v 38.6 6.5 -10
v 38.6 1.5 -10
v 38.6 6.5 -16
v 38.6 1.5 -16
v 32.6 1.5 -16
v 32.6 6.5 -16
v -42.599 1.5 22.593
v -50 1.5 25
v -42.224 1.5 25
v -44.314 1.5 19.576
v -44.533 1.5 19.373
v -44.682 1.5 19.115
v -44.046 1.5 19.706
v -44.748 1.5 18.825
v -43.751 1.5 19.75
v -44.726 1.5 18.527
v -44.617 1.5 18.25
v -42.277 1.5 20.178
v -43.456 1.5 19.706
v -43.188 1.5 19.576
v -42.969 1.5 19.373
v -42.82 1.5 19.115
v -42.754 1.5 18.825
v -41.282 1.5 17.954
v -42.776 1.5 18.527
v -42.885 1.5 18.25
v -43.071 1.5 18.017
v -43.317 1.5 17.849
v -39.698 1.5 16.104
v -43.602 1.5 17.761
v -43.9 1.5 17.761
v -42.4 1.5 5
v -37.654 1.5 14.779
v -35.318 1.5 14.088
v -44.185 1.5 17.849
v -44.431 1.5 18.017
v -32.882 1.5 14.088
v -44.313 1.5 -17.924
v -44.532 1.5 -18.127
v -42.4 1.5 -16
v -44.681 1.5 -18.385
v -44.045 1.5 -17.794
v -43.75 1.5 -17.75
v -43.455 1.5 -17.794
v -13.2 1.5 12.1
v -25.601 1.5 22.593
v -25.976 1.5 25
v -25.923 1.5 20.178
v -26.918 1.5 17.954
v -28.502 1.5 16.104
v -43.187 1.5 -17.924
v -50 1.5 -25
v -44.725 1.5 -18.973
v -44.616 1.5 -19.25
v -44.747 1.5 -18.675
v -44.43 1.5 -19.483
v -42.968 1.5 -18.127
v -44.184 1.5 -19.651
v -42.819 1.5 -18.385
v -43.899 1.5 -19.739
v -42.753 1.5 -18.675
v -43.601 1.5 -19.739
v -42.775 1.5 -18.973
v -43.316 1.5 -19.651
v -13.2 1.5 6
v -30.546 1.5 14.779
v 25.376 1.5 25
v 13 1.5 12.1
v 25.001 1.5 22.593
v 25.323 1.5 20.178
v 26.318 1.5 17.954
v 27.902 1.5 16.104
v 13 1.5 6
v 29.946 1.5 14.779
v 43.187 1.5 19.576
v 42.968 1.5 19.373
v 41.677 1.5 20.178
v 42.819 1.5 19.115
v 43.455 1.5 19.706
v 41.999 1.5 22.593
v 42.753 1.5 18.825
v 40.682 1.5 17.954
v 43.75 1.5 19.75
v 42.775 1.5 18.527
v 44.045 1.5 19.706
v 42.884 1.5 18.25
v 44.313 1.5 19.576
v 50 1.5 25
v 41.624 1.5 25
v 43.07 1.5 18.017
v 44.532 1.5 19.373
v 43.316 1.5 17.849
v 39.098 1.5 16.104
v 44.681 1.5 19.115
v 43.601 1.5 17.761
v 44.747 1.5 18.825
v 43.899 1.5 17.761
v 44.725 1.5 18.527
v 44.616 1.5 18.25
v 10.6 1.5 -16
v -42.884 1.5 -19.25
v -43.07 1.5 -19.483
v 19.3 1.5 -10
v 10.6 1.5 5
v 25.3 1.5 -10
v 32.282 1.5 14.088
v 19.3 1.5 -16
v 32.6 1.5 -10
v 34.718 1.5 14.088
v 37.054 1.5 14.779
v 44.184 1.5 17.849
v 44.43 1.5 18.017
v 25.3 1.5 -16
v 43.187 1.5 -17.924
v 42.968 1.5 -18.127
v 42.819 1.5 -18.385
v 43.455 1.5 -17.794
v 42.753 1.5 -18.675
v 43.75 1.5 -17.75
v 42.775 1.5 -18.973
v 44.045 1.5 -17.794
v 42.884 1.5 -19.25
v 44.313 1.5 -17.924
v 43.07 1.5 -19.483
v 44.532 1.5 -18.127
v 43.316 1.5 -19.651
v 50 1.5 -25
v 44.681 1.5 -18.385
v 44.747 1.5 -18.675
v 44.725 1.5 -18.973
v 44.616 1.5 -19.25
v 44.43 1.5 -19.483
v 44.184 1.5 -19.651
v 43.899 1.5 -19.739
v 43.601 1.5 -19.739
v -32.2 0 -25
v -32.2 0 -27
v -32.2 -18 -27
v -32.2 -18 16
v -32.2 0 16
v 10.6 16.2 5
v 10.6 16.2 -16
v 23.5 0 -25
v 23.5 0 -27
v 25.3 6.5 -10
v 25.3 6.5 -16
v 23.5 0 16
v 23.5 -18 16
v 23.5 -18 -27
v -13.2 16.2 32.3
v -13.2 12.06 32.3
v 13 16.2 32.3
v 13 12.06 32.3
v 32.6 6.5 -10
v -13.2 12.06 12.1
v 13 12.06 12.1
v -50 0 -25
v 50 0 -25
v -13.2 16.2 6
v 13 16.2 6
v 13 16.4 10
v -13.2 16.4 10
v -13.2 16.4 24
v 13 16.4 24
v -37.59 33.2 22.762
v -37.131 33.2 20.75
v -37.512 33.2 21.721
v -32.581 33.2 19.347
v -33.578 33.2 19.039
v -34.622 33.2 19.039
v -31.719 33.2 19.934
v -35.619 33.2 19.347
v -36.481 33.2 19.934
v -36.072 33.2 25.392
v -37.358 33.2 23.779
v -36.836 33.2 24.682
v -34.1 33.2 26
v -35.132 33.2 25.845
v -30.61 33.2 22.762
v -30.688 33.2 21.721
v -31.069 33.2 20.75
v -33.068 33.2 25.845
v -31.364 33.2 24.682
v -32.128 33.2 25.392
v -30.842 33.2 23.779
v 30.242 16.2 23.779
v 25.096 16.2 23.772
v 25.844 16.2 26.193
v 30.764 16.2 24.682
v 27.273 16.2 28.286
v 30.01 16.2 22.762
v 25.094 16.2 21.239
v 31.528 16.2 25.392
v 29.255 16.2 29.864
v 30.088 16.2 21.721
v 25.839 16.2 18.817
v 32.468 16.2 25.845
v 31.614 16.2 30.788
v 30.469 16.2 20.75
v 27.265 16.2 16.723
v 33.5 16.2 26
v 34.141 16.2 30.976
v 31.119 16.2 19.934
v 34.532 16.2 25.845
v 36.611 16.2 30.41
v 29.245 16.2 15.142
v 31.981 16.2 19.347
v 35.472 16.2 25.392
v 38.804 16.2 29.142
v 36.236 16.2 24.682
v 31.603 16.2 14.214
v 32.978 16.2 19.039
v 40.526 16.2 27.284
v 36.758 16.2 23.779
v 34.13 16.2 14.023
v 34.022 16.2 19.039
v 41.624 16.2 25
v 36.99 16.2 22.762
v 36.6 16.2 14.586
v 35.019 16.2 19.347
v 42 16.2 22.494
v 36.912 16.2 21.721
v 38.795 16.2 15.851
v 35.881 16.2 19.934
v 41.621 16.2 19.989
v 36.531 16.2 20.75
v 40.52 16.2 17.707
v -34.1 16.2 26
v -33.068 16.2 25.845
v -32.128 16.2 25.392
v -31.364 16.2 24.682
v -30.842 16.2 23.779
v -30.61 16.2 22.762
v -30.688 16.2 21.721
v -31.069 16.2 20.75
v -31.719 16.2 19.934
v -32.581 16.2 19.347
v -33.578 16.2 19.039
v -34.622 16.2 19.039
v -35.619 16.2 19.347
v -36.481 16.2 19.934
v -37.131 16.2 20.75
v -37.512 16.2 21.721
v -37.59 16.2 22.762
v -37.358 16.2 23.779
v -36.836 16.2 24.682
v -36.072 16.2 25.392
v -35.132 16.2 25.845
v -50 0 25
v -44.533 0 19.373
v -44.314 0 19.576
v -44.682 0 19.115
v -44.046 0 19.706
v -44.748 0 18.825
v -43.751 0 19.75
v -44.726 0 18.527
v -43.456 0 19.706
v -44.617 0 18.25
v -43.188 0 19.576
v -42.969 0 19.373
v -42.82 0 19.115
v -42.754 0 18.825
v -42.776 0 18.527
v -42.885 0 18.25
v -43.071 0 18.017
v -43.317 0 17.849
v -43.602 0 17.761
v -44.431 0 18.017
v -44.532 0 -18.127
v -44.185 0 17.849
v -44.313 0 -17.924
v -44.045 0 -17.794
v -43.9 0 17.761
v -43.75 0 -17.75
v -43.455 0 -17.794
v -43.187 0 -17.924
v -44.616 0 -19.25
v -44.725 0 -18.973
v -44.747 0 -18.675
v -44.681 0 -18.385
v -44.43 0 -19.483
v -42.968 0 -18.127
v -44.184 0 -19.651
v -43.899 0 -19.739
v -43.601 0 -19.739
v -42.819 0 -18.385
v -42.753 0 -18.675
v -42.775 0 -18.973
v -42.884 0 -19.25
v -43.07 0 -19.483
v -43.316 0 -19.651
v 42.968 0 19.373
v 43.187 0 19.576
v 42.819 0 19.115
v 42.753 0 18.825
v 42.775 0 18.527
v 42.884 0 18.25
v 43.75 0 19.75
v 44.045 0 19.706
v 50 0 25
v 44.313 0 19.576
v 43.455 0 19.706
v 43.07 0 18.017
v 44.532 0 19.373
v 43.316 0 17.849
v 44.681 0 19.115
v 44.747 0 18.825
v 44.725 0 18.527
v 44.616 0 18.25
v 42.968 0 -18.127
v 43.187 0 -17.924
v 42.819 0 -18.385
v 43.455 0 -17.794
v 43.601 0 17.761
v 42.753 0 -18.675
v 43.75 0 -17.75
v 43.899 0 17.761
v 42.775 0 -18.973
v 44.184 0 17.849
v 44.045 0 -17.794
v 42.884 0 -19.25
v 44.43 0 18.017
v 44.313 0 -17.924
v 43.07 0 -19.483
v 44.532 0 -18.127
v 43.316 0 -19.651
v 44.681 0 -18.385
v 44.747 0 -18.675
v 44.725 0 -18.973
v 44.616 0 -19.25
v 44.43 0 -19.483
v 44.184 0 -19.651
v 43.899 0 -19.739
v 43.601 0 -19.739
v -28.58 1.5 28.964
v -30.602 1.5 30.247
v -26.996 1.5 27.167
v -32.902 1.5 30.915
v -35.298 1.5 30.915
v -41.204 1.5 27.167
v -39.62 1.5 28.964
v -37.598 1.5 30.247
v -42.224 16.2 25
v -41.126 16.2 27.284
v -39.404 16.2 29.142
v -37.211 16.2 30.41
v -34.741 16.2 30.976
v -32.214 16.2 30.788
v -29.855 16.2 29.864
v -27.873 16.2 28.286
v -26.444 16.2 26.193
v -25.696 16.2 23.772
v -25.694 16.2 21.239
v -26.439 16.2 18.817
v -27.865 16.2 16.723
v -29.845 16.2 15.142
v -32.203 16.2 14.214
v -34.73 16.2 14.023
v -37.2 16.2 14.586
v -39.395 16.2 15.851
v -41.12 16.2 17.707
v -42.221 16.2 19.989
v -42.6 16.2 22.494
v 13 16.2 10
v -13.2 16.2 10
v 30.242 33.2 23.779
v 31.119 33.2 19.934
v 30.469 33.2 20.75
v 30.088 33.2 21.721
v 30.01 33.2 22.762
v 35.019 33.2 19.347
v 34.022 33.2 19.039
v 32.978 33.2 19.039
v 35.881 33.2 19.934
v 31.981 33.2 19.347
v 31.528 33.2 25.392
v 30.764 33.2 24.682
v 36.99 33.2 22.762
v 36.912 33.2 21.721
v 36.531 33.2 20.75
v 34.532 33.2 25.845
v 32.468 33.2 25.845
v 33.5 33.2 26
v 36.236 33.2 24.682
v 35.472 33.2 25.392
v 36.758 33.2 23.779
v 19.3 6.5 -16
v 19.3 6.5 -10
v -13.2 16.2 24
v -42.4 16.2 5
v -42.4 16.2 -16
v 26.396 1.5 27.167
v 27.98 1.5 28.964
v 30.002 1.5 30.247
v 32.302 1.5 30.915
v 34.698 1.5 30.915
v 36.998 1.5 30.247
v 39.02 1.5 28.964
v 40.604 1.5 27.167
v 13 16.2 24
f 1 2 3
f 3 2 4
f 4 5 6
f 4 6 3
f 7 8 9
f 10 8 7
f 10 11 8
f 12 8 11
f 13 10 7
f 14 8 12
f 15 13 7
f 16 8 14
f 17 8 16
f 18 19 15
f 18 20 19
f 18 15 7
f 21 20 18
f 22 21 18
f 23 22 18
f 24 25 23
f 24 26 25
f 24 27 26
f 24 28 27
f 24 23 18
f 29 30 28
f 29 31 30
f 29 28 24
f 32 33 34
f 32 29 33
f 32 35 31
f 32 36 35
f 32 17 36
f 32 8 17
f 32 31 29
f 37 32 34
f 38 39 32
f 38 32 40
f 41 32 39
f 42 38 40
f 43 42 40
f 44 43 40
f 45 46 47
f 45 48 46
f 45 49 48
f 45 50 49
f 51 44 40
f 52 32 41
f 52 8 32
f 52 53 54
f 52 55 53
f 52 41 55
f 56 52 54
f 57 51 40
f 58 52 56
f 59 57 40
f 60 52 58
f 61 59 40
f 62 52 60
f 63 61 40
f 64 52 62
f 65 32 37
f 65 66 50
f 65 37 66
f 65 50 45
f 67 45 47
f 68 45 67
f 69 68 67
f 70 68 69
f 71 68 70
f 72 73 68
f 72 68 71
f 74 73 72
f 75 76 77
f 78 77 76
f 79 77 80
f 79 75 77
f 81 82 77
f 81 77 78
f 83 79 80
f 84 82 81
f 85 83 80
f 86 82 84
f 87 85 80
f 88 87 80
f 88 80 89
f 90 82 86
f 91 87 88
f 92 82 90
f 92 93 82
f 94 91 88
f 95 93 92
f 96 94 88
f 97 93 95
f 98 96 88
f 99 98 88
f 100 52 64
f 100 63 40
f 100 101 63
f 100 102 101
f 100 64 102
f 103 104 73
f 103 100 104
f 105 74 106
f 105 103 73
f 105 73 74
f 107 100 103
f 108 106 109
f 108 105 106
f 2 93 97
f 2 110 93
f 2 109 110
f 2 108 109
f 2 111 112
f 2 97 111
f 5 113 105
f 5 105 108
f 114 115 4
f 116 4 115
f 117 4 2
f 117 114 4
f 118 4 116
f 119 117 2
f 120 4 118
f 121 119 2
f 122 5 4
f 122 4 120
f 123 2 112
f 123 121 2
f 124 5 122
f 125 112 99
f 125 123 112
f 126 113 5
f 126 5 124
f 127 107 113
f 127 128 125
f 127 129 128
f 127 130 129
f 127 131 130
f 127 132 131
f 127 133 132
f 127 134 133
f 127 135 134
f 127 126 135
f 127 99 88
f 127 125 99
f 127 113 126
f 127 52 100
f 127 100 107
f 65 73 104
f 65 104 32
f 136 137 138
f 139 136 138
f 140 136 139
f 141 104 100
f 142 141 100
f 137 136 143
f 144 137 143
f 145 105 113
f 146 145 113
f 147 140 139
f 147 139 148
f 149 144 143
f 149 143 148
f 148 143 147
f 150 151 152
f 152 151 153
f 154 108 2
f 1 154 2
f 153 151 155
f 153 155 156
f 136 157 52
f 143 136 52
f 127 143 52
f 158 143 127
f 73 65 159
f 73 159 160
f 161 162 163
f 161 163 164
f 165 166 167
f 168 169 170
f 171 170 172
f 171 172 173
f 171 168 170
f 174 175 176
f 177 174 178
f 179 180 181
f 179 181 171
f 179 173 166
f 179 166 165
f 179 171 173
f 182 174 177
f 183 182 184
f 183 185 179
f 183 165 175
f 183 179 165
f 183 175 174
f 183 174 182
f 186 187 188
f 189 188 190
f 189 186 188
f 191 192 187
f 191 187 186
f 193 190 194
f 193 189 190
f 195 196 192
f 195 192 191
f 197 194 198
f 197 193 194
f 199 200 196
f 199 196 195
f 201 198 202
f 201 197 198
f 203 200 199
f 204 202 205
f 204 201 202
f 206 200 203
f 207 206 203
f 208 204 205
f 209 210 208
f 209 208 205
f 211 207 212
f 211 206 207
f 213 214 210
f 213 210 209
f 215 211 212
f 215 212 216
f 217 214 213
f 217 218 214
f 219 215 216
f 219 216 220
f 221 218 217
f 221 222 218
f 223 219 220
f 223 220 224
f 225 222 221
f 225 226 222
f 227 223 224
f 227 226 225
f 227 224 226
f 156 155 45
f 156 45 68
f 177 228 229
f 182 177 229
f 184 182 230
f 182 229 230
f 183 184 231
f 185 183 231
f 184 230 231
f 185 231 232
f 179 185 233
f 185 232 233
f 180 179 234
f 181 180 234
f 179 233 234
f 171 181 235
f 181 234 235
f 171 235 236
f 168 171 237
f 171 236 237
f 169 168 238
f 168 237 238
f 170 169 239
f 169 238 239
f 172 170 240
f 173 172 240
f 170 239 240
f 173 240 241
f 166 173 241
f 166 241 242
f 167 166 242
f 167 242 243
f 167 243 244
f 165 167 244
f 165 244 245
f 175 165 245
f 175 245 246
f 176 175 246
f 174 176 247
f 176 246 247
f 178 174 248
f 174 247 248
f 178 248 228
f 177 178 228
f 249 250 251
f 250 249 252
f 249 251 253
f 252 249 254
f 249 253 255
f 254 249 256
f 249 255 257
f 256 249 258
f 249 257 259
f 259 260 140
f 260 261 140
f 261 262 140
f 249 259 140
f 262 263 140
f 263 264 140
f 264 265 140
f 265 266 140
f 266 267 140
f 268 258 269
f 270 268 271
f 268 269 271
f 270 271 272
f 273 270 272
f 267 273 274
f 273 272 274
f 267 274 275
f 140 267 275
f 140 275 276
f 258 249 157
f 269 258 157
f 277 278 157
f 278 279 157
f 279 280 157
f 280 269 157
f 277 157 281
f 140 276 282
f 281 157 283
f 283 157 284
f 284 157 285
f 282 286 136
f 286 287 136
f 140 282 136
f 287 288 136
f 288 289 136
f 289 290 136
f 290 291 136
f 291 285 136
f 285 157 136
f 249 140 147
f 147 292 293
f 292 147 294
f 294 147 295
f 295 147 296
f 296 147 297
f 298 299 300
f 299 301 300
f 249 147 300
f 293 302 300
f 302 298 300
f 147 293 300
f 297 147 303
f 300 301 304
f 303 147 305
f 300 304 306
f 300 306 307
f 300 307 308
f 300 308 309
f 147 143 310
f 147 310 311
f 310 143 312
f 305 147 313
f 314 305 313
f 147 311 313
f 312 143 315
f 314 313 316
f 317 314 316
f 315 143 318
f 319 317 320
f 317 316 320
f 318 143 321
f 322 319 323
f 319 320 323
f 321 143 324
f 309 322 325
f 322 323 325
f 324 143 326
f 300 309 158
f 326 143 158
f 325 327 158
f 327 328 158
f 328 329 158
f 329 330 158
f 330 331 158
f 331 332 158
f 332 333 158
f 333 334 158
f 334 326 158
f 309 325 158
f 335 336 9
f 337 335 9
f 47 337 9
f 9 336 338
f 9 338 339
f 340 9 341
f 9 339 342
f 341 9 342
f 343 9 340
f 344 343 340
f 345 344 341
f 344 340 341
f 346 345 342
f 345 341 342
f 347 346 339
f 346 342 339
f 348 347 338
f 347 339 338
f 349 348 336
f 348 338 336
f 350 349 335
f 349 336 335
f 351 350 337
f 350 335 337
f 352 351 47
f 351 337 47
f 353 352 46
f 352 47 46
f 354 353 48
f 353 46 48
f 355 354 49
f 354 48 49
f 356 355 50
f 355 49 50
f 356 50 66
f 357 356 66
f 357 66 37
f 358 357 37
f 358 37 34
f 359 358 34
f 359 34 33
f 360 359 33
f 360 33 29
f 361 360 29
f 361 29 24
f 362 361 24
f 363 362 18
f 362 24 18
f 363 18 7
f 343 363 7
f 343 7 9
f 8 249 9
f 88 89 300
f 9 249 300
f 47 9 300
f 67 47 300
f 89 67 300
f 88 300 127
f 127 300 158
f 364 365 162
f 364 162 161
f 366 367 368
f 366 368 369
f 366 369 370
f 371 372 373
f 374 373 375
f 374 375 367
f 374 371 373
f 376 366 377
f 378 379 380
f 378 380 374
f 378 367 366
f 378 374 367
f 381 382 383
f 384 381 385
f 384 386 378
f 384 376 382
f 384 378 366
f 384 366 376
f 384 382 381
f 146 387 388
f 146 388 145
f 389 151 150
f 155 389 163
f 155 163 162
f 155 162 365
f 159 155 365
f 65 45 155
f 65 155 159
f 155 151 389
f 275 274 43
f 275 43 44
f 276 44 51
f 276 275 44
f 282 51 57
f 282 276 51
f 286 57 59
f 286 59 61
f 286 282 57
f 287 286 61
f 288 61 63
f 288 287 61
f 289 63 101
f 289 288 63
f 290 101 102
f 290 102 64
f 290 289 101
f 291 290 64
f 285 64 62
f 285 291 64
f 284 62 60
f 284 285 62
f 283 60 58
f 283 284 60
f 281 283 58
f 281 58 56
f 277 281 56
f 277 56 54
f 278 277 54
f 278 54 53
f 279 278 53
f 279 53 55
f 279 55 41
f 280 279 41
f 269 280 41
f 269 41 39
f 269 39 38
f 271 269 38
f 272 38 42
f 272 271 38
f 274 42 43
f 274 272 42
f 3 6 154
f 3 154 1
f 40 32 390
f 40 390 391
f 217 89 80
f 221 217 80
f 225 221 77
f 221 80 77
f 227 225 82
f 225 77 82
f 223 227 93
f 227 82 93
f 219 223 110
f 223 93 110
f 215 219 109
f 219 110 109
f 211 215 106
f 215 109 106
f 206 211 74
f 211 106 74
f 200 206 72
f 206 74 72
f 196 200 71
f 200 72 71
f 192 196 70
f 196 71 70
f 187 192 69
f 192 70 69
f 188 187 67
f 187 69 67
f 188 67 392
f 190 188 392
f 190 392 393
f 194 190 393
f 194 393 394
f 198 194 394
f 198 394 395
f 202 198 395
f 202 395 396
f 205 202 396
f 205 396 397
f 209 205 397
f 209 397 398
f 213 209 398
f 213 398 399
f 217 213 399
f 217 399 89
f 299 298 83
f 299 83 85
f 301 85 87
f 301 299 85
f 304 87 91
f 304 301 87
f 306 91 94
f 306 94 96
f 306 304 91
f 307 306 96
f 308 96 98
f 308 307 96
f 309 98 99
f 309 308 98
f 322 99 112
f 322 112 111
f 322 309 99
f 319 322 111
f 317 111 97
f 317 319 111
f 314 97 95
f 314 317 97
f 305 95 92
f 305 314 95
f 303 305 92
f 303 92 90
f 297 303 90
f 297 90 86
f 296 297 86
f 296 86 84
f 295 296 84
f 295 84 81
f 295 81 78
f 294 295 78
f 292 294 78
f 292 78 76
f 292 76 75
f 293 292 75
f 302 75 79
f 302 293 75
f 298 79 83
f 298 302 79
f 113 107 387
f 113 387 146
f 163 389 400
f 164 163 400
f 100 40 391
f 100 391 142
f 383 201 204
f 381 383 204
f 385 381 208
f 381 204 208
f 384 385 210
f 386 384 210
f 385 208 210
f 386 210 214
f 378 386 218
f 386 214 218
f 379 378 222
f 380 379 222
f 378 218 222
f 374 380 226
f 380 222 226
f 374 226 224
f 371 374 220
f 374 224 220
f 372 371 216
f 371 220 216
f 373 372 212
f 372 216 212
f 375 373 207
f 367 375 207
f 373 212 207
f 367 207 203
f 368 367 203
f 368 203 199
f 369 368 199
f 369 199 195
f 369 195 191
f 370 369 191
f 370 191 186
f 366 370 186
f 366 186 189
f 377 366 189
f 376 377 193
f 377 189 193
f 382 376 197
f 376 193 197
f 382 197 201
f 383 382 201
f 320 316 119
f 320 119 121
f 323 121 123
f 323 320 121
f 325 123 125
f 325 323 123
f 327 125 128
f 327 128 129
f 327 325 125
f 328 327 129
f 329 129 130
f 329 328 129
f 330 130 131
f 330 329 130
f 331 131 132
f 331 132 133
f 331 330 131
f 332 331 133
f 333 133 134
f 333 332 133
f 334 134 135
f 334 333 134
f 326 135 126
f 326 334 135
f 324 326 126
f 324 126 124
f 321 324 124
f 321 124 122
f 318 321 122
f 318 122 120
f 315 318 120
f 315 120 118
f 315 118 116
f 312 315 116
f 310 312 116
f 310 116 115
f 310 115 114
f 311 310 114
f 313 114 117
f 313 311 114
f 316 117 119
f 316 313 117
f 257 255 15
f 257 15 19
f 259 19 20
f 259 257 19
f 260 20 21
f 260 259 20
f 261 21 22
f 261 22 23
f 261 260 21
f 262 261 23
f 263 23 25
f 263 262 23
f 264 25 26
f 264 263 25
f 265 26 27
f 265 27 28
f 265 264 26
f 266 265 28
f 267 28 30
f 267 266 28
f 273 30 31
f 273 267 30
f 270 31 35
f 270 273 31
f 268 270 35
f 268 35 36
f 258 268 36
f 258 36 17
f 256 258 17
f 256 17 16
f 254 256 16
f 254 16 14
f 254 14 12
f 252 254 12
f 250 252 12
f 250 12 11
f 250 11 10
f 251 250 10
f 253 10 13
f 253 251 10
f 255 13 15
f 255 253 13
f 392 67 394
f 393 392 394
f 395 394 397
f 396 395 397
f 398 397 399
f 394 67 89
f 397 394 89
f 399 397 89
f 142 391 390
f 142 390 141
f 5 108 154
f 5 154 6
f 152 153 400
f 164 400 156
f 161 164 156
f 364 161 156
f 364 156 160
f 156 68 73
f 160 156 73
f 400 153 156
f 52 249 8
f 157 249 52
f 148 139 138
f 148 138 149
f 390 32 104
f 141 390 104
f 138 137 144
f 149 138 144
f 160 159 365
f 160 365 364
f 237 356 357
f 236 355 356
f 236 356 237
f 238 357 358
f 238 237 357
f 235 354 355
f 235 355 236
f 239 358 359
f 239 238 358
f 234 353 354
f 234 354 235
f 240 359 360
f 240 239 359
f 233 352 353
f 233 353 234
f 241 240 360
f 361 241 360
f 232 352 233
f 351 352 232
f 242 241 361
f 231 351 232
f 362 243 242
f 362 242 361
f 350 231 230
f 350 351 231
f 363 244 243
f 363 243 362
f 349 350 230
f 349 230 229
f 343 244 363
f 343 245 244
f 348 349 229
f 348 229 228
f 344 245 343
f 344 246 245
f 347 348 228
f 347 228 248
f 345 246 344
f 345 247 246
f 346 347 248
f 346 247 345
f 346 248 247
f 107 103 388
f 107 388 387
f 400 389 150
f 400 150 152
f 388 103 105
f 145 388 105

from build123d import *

# Parameters (mm, degrees)
ESBO_O1_W                = 100
ESBO_O1_H                = 50
ESBO_O1_R                = 1
RESSALTO_EXTRUS_O1_DEPTH = 1.5
ESBO_O2_R                = 8.5
ESBO_O2_W                = 53
ESBO_O2_H                = 21
ESBO_O2_W_2              = 6
ESBO_O2_H_2              = 6
ESBO_O2_W_3              = 26.2
ESBO_O2_H_3              = 26.3
RESSALTO_EXTRUS_O4_DEPTH = 14.7
ESBO_O3_W                = 22.891769865
ESBO_O3_H                = 8.050029258
CORTE_EXTRUS_O1_DEPTH    = 9.7
ESBO_O4_R                = 3.5
RESSALTO_EXTRUS_O5_DEPTH = 17
ESBO_O5_W                = 55.7
ESBO_O5_H                = 43
RESSALTO_EXTRUS_O6_DEPTH = 18
ESBO_O6_W                = 26.2
ESBO_O6_H                = 14
RESSALTO_EXTRUS_O7_DEPTH = 0.2
ESBO_O7_W                = 26.2
ESBO_O7_H                = 10.560021921
CORTE_EXTRUS_O2_DEPTH    = 20.2


with BuildPart() as part:
    # Esboço1 → Ressalto-extrusão1 (new body)
    with BuildSketch(Plane(origin=(0, 0, 0), x_dir=(1, 0, 0), z_dir=(0, 1, 0))):
        Rectangle(ESBO_O1_W, ESBO_O1_H)
        with Locations(Location((43.75, 18.75, 0), (0, 0, 270))):
            Circle(ESBO_O1_R, mode=Mode.SUBTRACT)
        with Locations(Location((43.75, -18.75, 0), (0, 0, 270))):
            Circle(ESBO_O1_R, mode=Mode.SUBTRACT)
        with Locations(Location((-43.75, 18.749999801, 0), (0, 0, 270))):
            Circle(ESBO_O1_R, mode=Mode.SUBTRACT)
        with Locations(Location((-43.751173924, -18.750000181, 0), (0, 0, 270))):
            Circle(ESBO_O1_R, mode=Mode.SUBTRACT)
    extrude(amount=RESSALTO_EXTRUS_O1_DEPTH)

    # Esboço2 → Ressalto-extrusão4 (add)
    with BuildSketch(Plane(origin=(0, 1.5, 0), x_dir=(1, 0, 0), z_dir=(0, 1, 0))):
        with Locations(Location((33.5, -22.5, 0), (0, 0, 342.895364823))):
            Circle(ESBO_O2_R)
        with Locations(Location((-34.1, -22.5, 0), (0, 0, 197.104635177))):
            Circle(ESBO_O2_R)
        with Locations((-15.9, 5.5)):
            Rectangle(ESBO_O2_W, ESBO_O2_H)
        with Locations((22.3, 13)):
            Rectangle(ESBO_O2_W_2, ESBO_O2_H_2)
        with Locations((35.6, 13)):
            Rectangle(ESBO_O2_W_2, ESBO_O2_H_2)
        with Locations((-0.1, -19.15)):
            Rectangle(ESBO_O2_W_3, ESBO_O2_H_3)
    extrude(amount=RESSALTO_EXTRUS_O4_DEPTH)

    # Esboço3 → Corte-extrusão1 (cut)
    with BuildSketch(Plane(origin=(0, 16.2, 0), x_dir=(1, 0, 0), z_dir=(0, 1, 0))):
        with Locations((27.154115068, 14.025014629)):
            Rectangle(ESBO_O3_W, ESBO_O3_H)
    extrude(amount=-CORTE_EXTRUS_O1_DEPTH, mode=Mode.SUBTRACT)

    # Esboço4 → Ressalto-extrusão5 (add)
    with BuildSketch(Plane(origin=(0, 16.2, 0), x_dir=(1, 0, 0), z_dir=(0, 1, 0))):
        with Locations(Location((33.5, -22.5, 0), (0, 0, 270))):
            Circle(ESBO_O4_R)
        with Locations(Location((-34.1, -22.5, 0), (0, 0, 270))):
            Circle(ESBO_O4_R)
    extrude(amount=RESSALTO_EXTRUS_O5_DEPTH)

    # Esboço5 → Ressalto-extrusão6 (add)
    with BuildSketch(Plane.XZ):
        with Locations((-4.35, -5.5)):
            Rectangle(ESBO_O5_W, ESBO_O5_H)
    extrude(amount=RESSALTO_EXTRUS_O6_DEPTH)

    # Esboço6 → Ressalto-extrusão7 (add)
    with BuildSketch(Plane(origin=(0, 16.2, 0), x_dir=(1, 0, 0), z_dir=(0, 1, 0))):
        with Locations((-0.1, -17)):
            Rectangle(ESBO_O6_W, ESBO_O6_H)
    extrude(amount=RESSALTO_EXTRUS_O7_DEPTH)

    # Esboço7 → Corte-extrusão2 (cut)
    with BuildSketch(Plane.XY.offset(32.3)):
        with Locations((-0.1, 6.780010961)):
            Rectangle(ESBO_O7_W, ESBO_O7_H)
    extrude(amount=-CORTE_EXTRUS_O2_DEPTH, mode=Mode.SUBTRACT)


solid = part.part
